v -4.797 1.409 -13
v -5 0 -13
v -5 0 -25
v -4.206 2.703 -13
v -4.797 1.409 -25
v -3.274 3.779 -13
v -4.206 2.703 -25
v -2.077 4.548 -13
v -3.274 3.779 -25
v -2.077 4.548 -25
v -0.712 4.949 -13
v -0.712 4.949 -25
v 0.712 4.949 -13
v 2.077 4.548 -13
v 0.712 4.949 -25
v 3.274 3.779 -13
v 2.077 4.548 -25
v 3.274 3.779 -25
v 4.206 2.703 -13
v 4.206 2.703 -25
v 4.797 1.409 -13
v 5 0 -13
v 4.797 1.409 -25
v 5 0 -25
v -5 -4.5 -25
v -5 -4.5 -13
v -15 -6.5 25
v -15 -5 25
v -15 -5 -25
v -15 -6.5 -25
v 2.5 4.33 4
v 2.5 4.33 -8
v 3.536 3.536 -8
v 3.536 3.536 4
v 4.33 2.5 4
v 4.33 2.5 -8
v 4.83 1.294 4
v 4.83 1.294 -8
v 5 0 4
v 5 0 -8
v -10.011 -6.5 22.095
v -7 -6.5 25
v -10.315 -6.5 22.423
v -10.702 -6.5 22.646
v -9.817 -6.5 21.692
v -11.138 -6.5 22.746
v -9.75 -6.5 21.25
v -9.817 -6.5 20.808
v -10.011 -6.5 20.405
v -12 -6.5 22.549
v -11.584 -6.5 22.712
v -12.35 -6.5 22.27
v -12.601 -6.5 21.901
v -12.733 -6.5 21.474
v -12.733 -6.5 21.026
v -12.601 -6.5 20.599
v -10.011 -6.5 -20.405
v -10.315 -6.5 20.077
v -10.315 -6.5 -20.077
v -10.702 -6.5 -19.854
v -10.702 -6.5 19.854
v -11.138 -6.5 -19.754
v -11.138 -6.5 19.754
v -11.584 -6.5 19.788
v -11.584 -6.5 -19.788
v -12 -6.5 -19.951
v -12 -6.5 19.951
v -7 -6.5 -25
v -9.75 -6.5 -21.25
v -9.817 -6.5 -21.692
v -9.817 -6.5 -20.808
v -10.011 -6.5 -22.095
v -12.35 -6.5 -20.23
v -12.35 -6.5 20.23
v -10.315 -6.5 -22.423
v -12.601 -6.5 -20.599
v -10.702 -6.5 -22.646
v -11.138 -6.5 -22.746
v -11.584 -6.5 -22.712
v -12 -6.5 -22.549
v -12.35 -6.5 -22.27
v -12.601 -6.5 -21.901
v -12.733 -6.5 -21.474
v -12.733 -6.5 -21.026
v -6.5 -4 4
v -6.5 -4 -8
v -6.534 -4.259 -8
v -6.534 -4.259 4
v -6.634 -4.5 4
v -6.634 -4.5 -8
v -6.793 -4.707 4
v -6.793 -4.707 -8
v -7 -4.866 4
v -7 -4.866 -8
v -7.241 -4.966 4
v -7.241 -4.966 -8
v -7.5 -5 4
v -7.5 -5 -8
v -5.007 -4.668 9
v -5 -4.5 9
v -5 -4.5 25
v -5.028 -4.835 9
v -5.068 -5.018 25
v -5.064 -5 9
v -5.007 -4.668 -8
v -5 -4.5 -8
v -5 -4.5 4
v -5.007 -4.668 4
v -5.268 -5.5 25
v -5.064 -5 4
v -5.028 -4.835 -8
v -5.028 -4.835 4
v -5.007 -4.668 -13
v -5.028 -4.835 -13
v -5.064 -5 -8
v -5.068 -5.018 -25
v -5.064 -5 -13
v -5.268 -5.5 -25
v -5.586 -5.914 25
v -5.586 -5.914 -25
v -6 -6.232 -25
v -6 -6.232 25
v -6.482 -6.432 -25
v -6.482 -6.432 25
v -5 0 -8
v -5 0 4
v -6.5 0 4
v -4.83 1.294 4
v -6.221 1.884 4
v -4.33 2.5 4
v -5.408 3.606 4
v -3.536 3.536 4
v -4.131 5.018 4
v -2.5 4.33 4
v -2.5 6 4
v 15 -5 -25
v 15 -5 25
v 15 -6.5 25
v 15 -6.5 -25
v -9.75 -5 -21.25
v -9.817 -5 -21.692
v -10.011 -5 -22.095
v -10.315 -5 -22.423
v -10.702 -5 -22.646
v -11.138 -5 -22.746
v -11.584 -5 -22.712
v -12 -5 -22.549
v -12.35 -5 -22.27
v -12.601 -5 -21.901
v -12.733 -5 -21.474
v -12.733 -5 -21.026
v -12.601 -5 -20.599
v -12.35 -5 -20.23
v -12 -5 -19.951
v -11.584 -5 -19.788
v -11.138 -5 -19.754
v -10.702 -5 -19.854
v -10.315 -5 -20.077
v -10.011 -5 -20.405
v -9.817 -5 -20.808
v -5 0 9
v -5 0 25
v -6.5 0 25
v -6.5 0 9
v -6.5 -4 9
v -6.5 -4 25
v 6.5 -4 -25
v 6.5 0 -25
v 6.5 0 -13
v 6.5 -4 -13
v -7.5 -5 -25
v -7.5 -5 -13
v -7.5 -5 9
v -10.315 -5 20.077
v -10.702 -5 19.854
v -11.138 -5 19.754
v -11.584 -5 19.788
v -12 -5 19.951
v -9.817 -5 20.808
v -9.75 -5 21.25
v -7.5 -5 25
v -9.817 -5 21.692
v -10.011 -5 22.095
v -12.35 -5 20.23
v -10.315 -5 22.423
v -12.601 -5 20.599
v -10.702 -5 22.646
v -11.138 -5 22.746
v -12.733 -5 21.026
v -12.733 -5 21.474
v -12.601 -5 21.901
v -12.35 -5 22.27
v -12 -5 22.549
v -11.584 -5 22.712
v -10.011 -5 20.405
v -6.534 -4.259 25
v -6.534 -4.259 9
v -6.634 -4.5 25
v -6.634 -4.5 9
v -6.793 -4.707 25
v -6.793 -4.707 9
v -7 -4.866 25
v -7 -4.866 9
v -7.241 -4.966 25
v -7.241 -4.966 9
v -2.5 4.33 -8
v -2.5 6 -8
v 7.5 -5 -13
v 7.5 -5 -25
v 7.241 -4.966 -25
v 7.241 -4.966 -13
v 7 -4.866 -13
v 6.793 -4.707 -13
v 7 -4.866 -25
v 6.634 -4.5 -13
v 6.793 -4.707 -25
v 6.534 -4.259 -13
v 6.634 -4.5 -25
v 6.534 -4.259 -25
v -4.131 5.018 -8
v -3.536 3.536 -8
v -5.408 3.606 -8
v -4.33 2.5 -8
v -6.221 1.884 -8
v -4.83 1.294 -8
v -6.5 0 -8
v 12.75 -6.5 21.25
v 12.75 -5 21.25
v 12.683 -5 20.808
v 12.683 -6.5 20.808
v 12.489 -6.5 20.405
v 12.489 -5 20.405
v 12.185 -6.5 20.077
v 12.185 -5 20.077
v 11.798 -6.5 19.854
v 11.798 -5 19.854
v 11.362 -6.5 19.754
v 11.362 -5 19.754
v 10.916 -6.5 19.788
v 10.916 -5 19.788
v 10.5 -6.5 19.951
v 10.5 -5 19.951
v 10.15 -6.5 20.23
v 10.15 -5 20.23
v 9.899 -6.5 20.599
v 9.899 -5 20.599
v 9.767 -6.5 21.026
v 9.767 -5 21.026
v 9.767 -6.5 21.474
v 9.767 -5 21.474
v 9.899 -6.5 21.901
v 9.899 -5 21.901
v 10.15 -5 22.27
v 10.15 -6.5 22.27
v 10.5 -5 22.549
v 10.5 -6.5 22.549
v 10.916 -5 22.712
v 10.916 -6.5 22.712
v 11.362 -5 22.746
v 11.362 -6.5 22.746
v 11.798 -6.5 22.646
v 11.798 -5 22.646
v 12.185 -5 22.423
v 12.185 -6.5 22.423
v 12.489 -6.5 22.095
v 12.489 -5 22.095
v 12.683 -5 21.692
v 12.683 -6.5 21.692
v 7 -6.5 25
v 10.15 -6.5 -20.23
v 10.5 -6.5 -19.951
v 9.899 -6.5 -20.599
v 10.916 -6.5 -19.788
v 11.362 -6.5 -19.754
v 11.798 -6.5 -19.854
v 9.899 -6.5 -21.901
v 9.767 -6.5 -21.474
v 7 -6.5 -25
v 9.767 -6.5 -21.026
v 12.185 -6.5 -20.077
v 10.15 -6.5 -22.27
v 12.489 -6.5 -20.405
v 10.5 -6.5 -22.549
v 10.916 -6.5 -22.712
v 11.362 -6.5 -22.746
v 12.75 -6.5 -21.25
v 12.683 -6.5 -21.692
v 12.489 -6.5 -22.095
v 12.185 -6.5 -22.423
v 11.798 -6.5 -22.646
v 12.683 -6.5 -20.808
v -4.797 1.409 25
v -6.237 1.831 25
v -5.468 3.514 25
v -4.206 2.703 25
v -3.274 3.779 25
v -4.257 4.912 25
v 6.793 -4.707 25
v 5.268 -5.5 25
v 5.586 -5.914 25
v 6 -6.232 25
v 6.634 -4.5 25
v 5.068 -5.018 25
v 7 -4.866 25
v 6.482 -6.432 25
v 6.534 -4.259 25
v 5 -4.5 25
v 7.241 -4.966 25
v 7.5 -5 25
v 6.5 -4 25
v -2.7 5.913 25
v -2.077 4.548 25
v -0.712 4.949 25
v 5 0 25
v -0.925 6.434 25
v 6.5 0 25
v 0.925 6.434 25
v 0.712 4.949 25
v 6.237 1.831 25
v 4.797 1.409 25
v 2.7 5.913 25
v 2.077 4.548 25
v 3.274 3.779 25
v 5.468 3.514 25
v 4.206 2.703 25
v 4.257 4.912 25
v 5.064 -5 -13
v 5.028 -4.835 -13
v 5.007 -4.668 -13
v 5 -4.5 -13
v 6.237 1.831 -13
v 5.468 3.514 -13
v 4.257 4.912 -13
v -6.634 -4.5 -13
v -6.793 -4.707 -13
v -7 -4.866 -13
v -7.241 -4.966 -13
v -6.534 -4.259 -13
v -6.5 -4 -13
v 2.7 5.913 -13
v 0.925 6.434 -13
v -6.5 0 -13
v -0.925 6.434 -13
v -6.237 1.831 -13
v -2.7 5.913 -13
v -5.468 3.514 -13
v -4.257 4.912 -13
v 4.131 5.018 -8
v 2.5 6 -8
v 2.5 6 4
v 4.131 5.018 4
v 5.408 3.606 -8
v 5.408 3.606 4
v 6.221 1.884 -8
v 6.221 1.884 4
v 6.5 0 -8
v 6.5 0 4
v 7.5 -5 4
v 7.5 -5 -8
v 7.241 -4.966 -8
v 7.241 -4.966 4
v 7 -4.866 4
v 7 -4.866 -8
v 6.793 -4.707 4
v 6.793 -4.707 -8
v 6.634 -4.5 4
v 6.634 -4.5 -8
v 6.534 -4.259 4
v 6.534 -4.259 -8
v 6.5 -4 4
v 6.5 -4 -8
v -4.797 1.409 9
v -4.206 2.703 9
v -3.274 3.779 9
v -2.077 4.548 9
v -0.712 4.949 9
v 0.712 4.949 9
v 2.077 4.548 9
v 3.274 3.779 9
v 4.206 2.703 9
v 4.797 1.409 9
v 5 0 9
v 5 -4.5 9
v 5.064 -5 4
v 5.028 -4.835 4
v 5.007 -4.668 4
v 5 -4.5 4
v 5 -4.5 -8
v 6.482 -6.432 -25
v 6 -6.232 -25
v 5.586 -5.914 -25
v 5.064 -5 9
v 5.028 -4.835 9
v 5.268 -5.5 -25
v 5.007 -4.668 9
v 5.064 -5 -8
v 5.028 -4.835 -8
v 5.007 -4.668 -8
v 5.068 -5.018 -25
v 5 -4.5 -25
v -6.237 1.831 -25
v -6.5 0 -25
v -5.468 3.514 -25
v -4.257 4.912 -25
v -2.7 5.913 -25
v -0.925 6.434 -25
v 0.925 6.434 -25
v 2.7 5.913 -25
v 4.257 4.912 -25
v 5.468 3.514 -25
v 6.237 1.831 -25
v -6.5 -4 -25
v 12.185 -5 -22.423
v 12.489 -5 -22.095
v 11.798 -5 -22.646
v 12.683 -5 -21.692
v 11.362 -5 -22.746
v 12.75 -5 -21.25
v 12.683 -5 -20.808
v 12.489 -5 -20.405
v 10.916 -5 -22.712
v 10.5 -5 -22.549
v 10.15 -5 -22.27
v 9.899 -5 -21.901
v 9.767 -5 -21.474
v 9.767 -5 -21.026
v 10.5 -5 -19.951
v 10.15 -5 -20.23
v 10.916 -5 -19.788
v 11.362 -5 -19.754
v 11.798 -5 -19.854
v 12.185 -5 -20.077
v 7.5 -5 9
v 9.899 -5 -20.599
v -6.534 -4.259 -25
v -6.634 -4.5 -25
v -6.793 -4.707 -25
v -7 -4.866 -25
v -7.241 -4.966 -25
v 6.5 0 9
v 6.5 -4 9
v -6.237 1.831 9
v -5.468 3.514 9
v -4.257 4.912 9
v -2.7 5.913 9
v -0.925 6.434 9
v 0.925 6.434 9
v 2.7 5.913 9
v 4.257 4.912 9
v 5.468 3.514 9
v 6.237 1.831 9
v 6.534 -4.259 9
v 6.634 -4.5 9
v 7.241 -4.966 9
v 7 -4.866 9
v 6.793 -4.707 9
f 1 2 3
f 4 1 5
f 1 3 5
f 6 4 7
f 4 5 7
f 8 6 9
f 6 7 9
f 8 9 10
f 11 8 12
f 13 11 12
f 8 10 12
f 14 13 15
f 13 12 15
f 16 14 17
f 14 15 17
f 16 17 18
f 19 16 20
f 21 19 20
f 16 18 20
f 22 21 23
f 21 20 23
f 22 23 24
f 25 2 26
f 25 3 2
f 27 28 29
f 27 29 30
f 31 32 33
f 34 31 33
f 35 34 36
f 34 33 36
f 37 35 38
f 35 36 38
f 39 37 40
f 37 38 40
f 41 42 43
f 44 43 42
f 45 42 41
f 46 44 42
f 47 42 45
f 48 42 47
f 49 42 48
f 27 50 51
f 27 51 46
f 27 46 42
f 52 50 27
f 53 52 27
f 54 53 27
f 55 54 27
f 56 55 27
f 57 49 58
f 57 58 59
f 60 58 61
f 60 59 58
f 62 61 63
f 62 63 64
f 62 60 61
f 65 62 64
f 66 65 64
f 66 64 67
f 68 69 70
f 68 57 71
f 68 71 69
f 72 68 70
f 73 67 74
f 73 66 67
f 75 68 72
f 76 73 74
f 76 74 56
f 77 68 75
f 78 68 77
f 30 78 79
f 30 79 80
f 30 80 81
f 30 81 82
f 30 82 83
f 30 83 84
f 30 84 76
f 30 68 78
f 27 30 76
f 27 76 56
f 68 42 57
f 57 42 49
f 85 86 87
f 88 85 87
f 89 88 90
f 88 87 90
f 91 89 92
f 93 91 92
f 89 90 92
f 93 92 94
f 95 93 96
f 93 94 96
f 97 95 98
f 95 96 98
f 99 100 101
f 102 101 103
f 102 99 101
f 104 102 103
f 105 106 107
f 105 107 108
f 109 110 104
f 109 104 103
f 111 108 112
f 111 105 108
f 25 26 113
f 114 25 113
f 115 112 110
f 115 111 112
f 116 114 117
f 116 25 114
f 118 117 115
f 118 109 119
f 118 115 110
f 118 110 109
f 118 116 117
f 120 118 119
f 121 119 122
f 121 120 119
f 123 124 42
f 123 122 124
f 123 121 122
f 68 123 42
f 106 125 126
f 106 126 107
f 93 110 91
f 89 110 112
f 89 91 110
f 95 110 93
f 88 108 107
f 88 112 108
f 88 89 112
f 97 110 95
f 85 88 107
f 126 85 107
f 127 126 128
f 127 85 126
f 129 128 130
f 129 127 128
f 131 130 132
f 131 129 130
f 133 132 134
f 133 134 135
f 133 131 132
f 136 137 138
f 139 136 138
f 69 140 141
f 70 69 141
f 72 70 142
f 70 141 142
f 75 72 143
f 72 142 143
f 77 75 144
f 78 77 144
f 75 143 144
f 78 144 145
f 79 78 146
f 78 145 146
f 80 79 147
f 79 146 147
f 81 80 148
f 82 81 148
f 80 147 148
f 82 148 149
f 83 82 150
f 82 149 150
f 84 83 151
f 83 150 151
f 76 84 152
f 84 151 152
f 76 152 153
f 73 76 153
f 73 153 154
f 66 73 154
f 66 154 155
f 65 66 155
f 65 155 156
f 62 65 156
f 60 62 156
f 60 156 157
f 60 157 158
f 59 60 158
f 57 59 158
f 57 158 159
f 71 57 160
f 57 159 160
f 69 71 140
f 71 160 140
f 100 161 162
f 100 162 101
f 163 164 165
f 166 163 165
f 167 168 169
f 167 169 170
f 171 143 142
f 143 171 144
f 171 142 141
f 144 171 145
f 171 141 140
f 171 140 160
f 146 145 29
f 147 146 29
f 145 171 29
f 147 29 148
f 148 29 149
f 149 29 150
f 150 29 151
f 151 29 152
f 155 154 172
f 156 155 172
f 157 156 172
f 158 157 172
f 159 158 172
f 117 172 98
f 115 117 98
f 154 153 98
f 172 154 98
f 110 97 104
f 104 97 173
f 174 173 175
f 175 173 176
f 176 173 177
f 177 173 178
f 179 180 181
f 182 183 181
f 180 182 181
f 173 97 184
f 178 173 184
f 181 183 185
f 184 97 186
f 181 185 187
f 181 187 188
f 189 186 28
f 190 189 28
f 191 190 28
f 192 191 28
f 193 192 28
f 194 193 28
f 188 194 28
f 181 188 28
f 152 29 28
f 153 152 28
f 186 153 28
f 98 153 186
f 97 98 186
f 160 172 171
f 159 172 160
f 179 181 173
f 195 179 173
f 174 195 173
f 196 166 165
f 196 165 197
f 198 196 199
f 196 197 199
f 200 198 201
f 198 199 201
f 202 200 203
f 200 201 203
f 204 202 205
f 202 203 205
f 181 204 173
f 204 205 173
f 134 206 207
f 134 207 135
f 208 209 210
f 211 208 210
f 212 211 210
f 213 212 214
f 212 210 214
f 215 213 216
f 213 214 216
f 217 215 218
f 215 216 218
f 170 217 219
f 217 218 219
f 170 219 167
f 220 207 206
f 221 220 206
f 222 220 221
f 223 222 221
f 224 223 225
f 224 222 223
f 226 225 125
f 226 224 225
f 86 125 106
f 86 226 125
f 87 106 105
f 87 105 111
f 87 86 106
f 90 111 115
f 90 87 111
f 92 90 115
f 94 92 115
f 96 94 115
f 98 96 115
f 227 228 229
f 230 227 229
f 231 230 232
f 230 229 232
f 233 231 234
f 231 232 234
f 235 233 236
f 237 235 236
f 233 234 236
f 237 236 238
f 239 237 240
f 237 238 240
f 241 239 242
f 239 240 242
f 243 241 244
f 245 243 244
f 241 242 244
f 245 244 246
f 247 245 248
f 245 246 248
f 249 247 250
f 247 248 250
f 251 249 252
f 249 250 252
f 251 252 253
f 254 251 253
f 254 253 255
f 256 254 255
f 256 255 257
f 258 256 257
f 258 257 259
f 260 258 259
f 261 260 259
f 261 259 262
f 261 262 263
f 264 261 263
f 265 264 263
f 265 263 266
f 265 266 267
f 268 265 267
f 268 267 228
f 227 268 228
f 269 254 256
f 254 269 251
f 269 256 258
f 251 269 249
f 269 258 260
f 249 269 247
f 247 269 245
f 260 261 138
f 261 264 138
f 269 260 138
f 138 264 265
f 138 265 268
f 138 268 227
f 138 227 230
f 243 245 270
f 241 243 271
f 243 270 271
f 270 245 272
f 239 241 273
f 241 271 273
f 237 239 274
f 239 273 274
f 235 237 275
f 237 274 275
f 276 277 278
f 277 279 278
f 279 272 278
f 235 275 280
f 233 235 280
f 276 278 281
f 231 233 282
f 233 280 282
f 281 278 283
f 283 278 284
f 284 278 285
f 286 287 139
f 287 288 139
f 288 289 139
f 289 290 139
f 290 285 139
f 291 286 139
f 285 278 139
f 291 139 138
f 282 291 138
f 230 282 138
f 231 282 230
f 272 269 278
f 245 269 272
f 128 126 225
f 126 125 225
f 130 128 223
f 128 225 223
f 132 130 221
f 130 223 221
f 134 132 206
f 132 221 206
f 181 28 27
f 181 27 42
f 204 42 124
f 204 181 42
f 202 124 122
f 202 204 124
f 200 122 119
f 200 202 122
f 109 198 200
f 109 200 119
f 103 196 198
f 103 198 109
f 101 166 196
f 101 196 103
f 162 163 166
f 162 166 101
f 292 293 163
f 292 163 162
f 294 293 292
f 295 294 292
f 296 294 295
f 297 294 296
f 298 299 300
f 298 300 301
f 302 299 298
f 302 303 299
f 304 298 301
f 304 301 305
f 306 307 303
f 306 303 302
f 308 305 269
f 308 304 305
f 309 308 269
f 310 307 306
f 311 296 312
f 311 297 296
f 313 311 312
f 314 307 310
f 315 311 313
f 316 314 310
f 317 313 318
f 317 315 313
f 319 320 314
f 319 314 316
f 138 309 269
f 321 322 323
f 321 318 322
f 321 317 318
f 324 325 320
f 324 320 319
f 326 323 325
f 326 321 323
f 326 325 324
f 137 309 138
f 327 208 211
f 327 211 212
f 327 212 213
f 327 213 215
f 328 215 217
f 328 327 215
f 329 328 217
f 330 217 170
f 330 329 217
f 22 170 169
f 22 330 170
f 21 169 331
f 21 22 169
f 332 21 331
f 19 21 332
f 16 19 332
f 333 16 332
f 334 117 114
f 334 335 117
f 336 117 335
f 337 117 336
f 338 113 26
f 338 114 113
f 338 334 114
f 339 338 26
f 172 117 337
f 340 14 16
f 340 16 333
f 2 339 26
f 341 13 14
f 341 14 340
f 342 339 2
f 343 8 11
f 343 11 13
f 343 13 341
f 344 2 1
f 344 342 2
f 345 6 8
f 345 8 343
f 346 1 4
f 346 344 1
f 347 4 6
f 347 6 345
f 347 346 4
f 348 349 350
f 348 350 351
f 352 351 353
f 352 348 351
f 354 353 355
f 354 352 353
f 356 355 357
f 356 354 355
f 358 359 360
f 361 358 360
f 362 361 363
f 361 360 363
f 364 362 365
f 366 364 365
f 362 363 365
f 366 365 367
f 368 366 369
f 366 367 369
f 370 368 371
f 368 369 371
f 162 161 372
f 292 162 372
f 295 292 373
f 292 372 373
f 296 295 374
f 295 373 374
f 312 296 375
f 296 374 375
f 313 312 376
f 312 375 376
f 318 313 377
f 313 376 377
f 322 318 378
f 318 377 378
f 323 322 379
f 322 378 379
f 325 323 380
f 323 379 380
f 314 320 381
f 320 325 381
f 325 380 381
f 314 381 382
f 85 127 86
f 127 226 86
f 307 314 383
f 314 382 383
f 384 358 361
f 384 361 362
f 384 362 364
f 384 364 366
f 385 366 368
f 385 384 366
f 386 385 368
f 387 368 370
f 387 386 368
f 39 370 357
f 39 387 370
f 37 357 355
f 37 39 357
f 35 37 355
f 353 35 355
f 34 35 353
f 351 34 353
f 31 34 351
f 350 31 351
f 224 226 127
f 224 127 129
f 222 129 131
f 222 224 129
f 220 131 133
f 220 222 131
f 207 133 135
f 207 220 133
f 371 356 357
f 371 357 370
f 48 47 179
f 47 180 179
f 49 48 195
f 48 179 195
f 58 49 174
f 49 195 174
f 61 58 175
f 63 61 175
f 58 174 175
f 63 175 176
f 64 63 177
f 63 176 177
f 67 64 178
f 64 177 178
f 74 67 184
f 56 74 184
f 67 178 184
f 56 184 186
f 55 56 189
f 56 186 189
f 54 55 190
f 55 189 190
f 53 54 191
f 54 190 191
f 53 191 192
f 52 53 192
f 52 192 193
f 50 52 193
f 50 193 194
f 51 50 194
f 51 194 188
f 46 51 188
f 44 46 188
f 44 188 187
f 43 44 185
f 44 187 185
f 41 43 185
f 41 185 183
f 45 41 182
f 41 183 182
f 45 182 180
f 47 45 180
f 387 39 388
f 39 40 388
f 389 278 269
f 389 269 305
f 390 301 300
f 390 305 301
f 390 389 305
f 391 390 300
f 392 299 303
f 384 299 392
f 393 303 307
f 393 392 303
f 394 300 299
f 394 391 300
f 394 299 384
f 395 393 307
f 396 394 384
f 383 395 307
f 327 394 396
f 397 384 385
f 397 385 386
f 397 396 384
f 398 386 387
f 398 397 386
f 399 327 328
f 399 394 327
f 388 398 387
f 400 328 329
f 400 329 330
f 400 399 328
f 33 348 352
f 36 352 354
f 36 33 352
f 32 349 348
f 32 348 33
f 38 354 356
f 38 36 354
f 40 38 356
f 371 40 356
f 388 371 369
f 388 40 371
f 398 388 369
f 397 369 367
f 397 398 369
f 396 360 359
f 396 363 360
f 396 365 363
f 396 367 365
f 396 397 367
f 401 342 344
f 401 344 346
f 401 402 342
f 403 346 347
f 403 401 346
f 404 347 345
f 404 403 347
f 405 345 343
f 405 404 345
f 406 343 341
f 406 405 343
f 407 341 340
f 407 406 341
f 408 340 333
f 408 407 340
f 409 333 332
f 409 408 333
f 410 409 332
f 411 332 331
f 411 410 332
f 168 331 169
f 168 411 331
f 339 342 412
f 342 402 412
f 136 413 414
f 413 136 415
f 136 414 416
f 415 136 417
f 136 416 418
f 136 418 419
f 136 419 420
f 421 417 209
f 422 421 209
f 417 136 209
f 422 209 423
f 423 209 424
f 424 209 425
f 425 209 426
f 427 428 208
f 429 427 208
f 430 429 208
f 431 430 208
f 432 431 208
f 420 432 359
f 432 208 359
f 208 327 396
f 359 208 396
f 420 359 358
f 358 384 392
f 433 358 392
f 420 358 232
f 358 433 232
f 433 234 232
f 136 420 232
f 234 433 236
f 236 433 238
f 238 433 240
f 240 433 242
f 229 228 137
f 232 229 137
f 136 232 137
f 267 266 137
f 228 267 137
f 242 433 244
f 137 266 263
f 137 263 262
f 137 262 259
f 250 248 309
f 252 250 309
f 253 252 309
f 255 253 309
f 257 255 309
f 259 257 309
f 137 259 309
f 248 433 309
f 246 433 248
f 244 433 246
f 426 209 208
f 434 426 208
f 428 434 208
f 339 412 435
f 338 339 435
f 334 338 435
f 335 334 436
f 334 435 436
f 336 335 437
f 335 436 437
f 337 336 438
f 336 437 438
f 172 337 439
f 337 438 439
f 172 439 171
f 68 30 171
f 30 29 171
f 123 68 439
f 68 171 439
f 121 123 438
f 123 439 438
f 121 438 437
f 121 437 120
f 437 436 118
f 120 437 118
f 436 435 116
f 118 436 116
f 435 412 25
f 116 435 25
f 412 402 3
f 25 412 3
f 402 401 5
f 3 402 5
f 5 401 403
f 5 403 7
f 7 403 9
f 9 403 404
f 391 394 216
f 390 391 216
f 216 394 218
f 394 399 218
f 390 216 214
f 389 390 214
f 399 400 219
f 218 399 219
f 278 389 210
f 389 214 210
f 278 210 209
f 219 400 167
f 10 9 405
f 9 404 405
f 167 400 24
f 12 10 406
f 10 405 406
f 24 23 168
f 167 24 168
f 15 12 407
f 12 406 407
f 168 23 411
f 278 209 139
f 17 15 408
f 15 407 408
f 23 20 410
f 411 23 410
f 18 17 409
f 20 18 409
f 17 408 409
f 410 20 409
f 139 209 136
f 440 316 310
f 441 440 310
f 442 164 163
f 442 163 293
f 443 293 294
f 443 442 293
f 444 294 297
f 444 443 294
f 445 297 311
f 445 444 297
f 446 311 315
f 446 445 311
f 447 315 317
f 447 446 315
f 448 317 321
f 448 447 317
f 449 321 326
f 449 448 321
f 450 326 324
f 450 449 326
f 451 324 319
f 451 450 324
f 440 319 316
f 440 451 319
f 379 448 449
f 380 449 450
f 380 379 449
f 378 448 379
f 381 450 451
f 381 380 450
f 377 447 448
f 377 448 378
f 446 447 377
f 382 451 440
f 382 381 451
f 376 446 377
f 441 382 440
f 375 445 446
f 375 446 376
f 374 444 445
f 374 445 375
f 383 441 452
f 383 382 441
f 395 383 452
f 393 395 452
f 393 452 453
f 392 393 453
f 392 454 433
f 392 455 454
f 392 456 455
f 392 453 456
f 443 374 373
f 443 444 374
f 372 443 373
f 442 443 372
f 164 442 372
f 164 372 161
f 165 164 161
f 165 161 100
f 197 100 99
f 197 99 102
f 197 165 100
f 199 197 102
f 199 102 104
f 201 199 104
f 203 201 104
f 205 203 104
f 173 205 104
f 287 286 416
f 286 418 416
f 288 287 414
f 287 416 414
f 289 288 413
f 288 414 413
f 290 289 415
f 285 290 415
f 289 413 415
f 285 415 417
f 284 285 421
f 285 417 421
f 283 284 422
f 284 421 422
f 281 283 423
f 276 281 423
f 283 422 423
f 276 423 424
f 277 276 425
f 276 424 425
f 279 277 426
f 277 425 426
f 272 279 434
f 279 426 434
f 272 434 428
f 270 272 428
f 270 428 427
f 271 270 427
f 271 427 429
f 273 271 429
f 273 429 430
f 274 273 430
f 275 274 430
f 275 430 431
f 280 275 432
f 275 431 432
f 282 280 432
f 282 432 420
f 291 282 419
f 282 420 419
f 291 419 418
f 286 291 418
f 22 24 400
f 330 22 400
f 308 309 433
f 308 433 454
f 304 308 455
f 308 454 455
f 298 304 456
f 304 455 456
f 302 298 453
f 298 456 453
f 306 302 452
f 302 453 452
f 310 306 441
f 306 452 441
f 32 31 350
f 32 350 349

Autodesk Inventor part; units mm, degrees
ref_plane "YZ Plane" through (0, 0, 0) normal (1, 0, 0) x (0, 1, 0)
ref_plane "XZ Plane" through (0, 0, 0) normal (0, 1, 0) x (-1, 0, 0)
ref_plane "XY Plane" through (0, 0, 0) normal (0, 0, 1) x (1, 0, 0)
sketch "Sketch1" plane through (0, 0, 0) normal (0, 0, 1) x (1, 0, 0)
  arc A0 (5, 0) -> (0, 5) centre (0, 0) ccw
  arc A1 (6.5, 0) -> (0, 6.5) centre (0, 0) ccw
  line L0 (7, -6.5) -> (15, -6.5)
  line L1 (7.5, -5) -> (15, -5)
  line L2 (15, -5) -> (15, -6.5)
  line L3 (6.5, 0) -> (6.5, -4)
  line L4 (0, 10.9318) -> (0, -12.0627) construction
  line L5 (5, 0) -> (5, -4.5)
  arc A2 (5, -4.5) -> (7, -6.5) centre (7, -4.5) ccw
  arc A3 (6.5, -4) -> (7.5, -5) centre (7.5, -4) ccw
  arc A4 (0, 5) -> (-5, 0) centre (0, 0) ccw
  arc A5 (0, 6.5) -> (-6.5, 0) centre (0, 0) ccw
  line L6 (-7, -6.5) -> (-15, -6.5)
  line L7 (-7.5, -5) -> (-15, -5)
  line L8 (-15, -5) -> (-15, -6.5)
  line L9 (-6.5, 0) -> (-6.5, -4)
  line L10 (-5, 0) -> (-5, -4.5)
  arc A6 (-7, -6.5) -> (-5, -4.5) centre (-7, -4.5) ccw
  arc A7 (-7.5, -5) -> (-6.5, -4) centre (-7.5, -4) ccw
  dimension "d0" = 10
  dimension "d1" = 1.5
  dimension "d4" = 2
  dimension "d5" = 1
extrude "Extrusion1" add sketch "Sketch1" along normal mid plane 50
sketch "Sketch2" plane through (7.5, -5, 25) normal (0, 1, 0) x (1, 0, 0)
  circle A0 centre (-18.75, 3.75) radius 1.5
  circle A1 centre (3.75, 3.75) radius 1.5
  line L0 (7.5, 50) -> (7.5, 0) projected
  line L1 (-26.7627, 25) -> (16.6618, 25) construction
  circle A2 centre (-18.75, 46.25) radius 1.5
  circle A3 centre (3.75, 46.25) radius 1.5
  point P0 (-7.5, 25)
extrude "Extrusion2" cut sketch "Sketch2" against normal up to next
sketch "Sketch3" plane through (0, 0, 0) normal (1, 0, 0) x (0, 1, 0)
  line L0 (-5, 25) -> (-5, -25) construction
  line L1 (-5, -13) -> (11.6912, -13)
  line L2 (11.6912, -13) -> (11.6912, -8)
  line L3 (11.6912, -8) -> (-5, -8)
  line L4 (-5, 4) -> (11.6912, 4)
  line L5 (11.6912, 4) -> (11.6912, 9)
  line L6 (11.6912, 9) -> (-5, 9)
  line L7 (-5, 4) -> (-5, 9)
  line L8 (-5, -13) -> (-5, -8)
  point P0 (0, 0)
  dimension "d16" = 5
  dimension "d17" = 12
  dimension "d18" = 5
  dimension "d19" = 12
extrude "Extrusion3" cut sketch "Sketch3" along normal mid plane 50
sketch "Sketch4" plane through (0, 0, 0) normal (0, 1, 0) x (-1, 0, 0)
  line L0 (2.5, 6.6372) -> (-2.5, 6.6372)
  line L1 (-2.5, 6.6372) -> (-2.5, -10.1613)
  line L2 (-2.5, -10.1613) -> (2.5, -10.1613)
  line L3 (2.5, -10.1613) -> (2.5, 6.6372)
  line L4 (2.5, 6.6372) -> (-2.5, -10.1613) construction
  line L5 (-2.5, 6.6372) -> (2.5, -10.1613) construction
  point P0 (0, 0)
  point P1 (0, -1.7621)
  dimension "d22" = 5
extrude "Extrusion4" cut sketch "Sketch4" along normal up to next
